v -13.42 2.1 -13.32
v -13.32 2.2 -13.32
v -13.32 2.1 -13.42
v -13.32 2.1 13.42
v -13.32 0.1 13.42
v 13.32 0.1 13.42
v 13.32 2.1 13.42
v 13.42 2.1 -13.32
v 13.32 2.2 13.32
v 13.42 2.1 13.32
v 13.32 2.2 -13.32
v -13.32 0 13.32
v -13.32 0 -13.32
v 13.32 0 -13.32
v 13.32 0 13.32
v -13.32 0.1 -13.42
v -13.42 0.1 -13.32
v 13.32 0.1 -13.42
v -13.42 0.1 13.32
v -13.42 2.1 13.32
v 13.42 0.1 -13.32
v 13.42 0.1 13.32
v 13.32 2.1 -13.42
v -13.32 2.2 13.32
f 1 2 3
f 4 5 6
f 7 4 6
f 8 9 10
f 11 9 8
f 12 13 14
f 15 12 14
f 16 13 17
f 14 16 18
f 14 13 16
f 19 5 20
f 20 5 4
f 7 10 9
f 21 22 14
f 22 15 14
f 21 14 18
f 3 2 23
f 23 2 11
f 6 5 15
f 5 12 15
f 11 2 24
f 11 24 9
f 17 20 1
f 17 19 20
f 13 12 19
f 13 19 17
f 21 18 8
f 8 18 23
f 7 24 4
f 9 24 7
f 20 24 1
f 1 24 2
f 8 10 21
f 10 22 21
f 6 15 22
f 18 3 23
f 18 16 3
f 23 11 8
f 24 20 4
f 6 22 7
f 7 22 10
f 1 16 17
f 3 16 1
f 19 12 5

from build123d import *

# Parameters (mm, degrees)
SKETCH1_W           = 26.84
SKETCH1_H           = 26.84
BOSS_EXTRUDE1_DEPTH = 2.2
CHAMFER1_SIZE       = 0.1


with BuildPart() as part:
    # Sketch1 → Boss-Extrude1 (new body)
    with BuildSketch(Plane(origin=(0, 0, 0), x_dir=(1, 0, 0), z_dir=(0, 1, 0))):
        Rectangle(SKETCH1_W, SKETCH1_H)
    extrude(amount=BOSS_EXTRUDE1_DEPTH)

    # Chamfer1
    chamfer1_edges = [part.edges().sort_by_distance(p)[0] for p in [
        (13.42, 2.2, 0),
        (0, 2.2, -13.42),
        (-13.42, 2.2, 0),
        (0, 0, -13.42),
        (13.42, 0, 0),
        (0, 0, 13.42),
        (-13.42, 0, 0),
        (-13.42, 1.1, -13.42),
        (13.42, 1.1, -13.42),
        (13.42, 1.1, 13.42),
        (-13.42, 1.1, 13.42),
        (0, 2.2, 13.42),
    ]]
    chamfer(chamfer1_edges, length=CHAMFER1_SIZE)


solid = part.part
